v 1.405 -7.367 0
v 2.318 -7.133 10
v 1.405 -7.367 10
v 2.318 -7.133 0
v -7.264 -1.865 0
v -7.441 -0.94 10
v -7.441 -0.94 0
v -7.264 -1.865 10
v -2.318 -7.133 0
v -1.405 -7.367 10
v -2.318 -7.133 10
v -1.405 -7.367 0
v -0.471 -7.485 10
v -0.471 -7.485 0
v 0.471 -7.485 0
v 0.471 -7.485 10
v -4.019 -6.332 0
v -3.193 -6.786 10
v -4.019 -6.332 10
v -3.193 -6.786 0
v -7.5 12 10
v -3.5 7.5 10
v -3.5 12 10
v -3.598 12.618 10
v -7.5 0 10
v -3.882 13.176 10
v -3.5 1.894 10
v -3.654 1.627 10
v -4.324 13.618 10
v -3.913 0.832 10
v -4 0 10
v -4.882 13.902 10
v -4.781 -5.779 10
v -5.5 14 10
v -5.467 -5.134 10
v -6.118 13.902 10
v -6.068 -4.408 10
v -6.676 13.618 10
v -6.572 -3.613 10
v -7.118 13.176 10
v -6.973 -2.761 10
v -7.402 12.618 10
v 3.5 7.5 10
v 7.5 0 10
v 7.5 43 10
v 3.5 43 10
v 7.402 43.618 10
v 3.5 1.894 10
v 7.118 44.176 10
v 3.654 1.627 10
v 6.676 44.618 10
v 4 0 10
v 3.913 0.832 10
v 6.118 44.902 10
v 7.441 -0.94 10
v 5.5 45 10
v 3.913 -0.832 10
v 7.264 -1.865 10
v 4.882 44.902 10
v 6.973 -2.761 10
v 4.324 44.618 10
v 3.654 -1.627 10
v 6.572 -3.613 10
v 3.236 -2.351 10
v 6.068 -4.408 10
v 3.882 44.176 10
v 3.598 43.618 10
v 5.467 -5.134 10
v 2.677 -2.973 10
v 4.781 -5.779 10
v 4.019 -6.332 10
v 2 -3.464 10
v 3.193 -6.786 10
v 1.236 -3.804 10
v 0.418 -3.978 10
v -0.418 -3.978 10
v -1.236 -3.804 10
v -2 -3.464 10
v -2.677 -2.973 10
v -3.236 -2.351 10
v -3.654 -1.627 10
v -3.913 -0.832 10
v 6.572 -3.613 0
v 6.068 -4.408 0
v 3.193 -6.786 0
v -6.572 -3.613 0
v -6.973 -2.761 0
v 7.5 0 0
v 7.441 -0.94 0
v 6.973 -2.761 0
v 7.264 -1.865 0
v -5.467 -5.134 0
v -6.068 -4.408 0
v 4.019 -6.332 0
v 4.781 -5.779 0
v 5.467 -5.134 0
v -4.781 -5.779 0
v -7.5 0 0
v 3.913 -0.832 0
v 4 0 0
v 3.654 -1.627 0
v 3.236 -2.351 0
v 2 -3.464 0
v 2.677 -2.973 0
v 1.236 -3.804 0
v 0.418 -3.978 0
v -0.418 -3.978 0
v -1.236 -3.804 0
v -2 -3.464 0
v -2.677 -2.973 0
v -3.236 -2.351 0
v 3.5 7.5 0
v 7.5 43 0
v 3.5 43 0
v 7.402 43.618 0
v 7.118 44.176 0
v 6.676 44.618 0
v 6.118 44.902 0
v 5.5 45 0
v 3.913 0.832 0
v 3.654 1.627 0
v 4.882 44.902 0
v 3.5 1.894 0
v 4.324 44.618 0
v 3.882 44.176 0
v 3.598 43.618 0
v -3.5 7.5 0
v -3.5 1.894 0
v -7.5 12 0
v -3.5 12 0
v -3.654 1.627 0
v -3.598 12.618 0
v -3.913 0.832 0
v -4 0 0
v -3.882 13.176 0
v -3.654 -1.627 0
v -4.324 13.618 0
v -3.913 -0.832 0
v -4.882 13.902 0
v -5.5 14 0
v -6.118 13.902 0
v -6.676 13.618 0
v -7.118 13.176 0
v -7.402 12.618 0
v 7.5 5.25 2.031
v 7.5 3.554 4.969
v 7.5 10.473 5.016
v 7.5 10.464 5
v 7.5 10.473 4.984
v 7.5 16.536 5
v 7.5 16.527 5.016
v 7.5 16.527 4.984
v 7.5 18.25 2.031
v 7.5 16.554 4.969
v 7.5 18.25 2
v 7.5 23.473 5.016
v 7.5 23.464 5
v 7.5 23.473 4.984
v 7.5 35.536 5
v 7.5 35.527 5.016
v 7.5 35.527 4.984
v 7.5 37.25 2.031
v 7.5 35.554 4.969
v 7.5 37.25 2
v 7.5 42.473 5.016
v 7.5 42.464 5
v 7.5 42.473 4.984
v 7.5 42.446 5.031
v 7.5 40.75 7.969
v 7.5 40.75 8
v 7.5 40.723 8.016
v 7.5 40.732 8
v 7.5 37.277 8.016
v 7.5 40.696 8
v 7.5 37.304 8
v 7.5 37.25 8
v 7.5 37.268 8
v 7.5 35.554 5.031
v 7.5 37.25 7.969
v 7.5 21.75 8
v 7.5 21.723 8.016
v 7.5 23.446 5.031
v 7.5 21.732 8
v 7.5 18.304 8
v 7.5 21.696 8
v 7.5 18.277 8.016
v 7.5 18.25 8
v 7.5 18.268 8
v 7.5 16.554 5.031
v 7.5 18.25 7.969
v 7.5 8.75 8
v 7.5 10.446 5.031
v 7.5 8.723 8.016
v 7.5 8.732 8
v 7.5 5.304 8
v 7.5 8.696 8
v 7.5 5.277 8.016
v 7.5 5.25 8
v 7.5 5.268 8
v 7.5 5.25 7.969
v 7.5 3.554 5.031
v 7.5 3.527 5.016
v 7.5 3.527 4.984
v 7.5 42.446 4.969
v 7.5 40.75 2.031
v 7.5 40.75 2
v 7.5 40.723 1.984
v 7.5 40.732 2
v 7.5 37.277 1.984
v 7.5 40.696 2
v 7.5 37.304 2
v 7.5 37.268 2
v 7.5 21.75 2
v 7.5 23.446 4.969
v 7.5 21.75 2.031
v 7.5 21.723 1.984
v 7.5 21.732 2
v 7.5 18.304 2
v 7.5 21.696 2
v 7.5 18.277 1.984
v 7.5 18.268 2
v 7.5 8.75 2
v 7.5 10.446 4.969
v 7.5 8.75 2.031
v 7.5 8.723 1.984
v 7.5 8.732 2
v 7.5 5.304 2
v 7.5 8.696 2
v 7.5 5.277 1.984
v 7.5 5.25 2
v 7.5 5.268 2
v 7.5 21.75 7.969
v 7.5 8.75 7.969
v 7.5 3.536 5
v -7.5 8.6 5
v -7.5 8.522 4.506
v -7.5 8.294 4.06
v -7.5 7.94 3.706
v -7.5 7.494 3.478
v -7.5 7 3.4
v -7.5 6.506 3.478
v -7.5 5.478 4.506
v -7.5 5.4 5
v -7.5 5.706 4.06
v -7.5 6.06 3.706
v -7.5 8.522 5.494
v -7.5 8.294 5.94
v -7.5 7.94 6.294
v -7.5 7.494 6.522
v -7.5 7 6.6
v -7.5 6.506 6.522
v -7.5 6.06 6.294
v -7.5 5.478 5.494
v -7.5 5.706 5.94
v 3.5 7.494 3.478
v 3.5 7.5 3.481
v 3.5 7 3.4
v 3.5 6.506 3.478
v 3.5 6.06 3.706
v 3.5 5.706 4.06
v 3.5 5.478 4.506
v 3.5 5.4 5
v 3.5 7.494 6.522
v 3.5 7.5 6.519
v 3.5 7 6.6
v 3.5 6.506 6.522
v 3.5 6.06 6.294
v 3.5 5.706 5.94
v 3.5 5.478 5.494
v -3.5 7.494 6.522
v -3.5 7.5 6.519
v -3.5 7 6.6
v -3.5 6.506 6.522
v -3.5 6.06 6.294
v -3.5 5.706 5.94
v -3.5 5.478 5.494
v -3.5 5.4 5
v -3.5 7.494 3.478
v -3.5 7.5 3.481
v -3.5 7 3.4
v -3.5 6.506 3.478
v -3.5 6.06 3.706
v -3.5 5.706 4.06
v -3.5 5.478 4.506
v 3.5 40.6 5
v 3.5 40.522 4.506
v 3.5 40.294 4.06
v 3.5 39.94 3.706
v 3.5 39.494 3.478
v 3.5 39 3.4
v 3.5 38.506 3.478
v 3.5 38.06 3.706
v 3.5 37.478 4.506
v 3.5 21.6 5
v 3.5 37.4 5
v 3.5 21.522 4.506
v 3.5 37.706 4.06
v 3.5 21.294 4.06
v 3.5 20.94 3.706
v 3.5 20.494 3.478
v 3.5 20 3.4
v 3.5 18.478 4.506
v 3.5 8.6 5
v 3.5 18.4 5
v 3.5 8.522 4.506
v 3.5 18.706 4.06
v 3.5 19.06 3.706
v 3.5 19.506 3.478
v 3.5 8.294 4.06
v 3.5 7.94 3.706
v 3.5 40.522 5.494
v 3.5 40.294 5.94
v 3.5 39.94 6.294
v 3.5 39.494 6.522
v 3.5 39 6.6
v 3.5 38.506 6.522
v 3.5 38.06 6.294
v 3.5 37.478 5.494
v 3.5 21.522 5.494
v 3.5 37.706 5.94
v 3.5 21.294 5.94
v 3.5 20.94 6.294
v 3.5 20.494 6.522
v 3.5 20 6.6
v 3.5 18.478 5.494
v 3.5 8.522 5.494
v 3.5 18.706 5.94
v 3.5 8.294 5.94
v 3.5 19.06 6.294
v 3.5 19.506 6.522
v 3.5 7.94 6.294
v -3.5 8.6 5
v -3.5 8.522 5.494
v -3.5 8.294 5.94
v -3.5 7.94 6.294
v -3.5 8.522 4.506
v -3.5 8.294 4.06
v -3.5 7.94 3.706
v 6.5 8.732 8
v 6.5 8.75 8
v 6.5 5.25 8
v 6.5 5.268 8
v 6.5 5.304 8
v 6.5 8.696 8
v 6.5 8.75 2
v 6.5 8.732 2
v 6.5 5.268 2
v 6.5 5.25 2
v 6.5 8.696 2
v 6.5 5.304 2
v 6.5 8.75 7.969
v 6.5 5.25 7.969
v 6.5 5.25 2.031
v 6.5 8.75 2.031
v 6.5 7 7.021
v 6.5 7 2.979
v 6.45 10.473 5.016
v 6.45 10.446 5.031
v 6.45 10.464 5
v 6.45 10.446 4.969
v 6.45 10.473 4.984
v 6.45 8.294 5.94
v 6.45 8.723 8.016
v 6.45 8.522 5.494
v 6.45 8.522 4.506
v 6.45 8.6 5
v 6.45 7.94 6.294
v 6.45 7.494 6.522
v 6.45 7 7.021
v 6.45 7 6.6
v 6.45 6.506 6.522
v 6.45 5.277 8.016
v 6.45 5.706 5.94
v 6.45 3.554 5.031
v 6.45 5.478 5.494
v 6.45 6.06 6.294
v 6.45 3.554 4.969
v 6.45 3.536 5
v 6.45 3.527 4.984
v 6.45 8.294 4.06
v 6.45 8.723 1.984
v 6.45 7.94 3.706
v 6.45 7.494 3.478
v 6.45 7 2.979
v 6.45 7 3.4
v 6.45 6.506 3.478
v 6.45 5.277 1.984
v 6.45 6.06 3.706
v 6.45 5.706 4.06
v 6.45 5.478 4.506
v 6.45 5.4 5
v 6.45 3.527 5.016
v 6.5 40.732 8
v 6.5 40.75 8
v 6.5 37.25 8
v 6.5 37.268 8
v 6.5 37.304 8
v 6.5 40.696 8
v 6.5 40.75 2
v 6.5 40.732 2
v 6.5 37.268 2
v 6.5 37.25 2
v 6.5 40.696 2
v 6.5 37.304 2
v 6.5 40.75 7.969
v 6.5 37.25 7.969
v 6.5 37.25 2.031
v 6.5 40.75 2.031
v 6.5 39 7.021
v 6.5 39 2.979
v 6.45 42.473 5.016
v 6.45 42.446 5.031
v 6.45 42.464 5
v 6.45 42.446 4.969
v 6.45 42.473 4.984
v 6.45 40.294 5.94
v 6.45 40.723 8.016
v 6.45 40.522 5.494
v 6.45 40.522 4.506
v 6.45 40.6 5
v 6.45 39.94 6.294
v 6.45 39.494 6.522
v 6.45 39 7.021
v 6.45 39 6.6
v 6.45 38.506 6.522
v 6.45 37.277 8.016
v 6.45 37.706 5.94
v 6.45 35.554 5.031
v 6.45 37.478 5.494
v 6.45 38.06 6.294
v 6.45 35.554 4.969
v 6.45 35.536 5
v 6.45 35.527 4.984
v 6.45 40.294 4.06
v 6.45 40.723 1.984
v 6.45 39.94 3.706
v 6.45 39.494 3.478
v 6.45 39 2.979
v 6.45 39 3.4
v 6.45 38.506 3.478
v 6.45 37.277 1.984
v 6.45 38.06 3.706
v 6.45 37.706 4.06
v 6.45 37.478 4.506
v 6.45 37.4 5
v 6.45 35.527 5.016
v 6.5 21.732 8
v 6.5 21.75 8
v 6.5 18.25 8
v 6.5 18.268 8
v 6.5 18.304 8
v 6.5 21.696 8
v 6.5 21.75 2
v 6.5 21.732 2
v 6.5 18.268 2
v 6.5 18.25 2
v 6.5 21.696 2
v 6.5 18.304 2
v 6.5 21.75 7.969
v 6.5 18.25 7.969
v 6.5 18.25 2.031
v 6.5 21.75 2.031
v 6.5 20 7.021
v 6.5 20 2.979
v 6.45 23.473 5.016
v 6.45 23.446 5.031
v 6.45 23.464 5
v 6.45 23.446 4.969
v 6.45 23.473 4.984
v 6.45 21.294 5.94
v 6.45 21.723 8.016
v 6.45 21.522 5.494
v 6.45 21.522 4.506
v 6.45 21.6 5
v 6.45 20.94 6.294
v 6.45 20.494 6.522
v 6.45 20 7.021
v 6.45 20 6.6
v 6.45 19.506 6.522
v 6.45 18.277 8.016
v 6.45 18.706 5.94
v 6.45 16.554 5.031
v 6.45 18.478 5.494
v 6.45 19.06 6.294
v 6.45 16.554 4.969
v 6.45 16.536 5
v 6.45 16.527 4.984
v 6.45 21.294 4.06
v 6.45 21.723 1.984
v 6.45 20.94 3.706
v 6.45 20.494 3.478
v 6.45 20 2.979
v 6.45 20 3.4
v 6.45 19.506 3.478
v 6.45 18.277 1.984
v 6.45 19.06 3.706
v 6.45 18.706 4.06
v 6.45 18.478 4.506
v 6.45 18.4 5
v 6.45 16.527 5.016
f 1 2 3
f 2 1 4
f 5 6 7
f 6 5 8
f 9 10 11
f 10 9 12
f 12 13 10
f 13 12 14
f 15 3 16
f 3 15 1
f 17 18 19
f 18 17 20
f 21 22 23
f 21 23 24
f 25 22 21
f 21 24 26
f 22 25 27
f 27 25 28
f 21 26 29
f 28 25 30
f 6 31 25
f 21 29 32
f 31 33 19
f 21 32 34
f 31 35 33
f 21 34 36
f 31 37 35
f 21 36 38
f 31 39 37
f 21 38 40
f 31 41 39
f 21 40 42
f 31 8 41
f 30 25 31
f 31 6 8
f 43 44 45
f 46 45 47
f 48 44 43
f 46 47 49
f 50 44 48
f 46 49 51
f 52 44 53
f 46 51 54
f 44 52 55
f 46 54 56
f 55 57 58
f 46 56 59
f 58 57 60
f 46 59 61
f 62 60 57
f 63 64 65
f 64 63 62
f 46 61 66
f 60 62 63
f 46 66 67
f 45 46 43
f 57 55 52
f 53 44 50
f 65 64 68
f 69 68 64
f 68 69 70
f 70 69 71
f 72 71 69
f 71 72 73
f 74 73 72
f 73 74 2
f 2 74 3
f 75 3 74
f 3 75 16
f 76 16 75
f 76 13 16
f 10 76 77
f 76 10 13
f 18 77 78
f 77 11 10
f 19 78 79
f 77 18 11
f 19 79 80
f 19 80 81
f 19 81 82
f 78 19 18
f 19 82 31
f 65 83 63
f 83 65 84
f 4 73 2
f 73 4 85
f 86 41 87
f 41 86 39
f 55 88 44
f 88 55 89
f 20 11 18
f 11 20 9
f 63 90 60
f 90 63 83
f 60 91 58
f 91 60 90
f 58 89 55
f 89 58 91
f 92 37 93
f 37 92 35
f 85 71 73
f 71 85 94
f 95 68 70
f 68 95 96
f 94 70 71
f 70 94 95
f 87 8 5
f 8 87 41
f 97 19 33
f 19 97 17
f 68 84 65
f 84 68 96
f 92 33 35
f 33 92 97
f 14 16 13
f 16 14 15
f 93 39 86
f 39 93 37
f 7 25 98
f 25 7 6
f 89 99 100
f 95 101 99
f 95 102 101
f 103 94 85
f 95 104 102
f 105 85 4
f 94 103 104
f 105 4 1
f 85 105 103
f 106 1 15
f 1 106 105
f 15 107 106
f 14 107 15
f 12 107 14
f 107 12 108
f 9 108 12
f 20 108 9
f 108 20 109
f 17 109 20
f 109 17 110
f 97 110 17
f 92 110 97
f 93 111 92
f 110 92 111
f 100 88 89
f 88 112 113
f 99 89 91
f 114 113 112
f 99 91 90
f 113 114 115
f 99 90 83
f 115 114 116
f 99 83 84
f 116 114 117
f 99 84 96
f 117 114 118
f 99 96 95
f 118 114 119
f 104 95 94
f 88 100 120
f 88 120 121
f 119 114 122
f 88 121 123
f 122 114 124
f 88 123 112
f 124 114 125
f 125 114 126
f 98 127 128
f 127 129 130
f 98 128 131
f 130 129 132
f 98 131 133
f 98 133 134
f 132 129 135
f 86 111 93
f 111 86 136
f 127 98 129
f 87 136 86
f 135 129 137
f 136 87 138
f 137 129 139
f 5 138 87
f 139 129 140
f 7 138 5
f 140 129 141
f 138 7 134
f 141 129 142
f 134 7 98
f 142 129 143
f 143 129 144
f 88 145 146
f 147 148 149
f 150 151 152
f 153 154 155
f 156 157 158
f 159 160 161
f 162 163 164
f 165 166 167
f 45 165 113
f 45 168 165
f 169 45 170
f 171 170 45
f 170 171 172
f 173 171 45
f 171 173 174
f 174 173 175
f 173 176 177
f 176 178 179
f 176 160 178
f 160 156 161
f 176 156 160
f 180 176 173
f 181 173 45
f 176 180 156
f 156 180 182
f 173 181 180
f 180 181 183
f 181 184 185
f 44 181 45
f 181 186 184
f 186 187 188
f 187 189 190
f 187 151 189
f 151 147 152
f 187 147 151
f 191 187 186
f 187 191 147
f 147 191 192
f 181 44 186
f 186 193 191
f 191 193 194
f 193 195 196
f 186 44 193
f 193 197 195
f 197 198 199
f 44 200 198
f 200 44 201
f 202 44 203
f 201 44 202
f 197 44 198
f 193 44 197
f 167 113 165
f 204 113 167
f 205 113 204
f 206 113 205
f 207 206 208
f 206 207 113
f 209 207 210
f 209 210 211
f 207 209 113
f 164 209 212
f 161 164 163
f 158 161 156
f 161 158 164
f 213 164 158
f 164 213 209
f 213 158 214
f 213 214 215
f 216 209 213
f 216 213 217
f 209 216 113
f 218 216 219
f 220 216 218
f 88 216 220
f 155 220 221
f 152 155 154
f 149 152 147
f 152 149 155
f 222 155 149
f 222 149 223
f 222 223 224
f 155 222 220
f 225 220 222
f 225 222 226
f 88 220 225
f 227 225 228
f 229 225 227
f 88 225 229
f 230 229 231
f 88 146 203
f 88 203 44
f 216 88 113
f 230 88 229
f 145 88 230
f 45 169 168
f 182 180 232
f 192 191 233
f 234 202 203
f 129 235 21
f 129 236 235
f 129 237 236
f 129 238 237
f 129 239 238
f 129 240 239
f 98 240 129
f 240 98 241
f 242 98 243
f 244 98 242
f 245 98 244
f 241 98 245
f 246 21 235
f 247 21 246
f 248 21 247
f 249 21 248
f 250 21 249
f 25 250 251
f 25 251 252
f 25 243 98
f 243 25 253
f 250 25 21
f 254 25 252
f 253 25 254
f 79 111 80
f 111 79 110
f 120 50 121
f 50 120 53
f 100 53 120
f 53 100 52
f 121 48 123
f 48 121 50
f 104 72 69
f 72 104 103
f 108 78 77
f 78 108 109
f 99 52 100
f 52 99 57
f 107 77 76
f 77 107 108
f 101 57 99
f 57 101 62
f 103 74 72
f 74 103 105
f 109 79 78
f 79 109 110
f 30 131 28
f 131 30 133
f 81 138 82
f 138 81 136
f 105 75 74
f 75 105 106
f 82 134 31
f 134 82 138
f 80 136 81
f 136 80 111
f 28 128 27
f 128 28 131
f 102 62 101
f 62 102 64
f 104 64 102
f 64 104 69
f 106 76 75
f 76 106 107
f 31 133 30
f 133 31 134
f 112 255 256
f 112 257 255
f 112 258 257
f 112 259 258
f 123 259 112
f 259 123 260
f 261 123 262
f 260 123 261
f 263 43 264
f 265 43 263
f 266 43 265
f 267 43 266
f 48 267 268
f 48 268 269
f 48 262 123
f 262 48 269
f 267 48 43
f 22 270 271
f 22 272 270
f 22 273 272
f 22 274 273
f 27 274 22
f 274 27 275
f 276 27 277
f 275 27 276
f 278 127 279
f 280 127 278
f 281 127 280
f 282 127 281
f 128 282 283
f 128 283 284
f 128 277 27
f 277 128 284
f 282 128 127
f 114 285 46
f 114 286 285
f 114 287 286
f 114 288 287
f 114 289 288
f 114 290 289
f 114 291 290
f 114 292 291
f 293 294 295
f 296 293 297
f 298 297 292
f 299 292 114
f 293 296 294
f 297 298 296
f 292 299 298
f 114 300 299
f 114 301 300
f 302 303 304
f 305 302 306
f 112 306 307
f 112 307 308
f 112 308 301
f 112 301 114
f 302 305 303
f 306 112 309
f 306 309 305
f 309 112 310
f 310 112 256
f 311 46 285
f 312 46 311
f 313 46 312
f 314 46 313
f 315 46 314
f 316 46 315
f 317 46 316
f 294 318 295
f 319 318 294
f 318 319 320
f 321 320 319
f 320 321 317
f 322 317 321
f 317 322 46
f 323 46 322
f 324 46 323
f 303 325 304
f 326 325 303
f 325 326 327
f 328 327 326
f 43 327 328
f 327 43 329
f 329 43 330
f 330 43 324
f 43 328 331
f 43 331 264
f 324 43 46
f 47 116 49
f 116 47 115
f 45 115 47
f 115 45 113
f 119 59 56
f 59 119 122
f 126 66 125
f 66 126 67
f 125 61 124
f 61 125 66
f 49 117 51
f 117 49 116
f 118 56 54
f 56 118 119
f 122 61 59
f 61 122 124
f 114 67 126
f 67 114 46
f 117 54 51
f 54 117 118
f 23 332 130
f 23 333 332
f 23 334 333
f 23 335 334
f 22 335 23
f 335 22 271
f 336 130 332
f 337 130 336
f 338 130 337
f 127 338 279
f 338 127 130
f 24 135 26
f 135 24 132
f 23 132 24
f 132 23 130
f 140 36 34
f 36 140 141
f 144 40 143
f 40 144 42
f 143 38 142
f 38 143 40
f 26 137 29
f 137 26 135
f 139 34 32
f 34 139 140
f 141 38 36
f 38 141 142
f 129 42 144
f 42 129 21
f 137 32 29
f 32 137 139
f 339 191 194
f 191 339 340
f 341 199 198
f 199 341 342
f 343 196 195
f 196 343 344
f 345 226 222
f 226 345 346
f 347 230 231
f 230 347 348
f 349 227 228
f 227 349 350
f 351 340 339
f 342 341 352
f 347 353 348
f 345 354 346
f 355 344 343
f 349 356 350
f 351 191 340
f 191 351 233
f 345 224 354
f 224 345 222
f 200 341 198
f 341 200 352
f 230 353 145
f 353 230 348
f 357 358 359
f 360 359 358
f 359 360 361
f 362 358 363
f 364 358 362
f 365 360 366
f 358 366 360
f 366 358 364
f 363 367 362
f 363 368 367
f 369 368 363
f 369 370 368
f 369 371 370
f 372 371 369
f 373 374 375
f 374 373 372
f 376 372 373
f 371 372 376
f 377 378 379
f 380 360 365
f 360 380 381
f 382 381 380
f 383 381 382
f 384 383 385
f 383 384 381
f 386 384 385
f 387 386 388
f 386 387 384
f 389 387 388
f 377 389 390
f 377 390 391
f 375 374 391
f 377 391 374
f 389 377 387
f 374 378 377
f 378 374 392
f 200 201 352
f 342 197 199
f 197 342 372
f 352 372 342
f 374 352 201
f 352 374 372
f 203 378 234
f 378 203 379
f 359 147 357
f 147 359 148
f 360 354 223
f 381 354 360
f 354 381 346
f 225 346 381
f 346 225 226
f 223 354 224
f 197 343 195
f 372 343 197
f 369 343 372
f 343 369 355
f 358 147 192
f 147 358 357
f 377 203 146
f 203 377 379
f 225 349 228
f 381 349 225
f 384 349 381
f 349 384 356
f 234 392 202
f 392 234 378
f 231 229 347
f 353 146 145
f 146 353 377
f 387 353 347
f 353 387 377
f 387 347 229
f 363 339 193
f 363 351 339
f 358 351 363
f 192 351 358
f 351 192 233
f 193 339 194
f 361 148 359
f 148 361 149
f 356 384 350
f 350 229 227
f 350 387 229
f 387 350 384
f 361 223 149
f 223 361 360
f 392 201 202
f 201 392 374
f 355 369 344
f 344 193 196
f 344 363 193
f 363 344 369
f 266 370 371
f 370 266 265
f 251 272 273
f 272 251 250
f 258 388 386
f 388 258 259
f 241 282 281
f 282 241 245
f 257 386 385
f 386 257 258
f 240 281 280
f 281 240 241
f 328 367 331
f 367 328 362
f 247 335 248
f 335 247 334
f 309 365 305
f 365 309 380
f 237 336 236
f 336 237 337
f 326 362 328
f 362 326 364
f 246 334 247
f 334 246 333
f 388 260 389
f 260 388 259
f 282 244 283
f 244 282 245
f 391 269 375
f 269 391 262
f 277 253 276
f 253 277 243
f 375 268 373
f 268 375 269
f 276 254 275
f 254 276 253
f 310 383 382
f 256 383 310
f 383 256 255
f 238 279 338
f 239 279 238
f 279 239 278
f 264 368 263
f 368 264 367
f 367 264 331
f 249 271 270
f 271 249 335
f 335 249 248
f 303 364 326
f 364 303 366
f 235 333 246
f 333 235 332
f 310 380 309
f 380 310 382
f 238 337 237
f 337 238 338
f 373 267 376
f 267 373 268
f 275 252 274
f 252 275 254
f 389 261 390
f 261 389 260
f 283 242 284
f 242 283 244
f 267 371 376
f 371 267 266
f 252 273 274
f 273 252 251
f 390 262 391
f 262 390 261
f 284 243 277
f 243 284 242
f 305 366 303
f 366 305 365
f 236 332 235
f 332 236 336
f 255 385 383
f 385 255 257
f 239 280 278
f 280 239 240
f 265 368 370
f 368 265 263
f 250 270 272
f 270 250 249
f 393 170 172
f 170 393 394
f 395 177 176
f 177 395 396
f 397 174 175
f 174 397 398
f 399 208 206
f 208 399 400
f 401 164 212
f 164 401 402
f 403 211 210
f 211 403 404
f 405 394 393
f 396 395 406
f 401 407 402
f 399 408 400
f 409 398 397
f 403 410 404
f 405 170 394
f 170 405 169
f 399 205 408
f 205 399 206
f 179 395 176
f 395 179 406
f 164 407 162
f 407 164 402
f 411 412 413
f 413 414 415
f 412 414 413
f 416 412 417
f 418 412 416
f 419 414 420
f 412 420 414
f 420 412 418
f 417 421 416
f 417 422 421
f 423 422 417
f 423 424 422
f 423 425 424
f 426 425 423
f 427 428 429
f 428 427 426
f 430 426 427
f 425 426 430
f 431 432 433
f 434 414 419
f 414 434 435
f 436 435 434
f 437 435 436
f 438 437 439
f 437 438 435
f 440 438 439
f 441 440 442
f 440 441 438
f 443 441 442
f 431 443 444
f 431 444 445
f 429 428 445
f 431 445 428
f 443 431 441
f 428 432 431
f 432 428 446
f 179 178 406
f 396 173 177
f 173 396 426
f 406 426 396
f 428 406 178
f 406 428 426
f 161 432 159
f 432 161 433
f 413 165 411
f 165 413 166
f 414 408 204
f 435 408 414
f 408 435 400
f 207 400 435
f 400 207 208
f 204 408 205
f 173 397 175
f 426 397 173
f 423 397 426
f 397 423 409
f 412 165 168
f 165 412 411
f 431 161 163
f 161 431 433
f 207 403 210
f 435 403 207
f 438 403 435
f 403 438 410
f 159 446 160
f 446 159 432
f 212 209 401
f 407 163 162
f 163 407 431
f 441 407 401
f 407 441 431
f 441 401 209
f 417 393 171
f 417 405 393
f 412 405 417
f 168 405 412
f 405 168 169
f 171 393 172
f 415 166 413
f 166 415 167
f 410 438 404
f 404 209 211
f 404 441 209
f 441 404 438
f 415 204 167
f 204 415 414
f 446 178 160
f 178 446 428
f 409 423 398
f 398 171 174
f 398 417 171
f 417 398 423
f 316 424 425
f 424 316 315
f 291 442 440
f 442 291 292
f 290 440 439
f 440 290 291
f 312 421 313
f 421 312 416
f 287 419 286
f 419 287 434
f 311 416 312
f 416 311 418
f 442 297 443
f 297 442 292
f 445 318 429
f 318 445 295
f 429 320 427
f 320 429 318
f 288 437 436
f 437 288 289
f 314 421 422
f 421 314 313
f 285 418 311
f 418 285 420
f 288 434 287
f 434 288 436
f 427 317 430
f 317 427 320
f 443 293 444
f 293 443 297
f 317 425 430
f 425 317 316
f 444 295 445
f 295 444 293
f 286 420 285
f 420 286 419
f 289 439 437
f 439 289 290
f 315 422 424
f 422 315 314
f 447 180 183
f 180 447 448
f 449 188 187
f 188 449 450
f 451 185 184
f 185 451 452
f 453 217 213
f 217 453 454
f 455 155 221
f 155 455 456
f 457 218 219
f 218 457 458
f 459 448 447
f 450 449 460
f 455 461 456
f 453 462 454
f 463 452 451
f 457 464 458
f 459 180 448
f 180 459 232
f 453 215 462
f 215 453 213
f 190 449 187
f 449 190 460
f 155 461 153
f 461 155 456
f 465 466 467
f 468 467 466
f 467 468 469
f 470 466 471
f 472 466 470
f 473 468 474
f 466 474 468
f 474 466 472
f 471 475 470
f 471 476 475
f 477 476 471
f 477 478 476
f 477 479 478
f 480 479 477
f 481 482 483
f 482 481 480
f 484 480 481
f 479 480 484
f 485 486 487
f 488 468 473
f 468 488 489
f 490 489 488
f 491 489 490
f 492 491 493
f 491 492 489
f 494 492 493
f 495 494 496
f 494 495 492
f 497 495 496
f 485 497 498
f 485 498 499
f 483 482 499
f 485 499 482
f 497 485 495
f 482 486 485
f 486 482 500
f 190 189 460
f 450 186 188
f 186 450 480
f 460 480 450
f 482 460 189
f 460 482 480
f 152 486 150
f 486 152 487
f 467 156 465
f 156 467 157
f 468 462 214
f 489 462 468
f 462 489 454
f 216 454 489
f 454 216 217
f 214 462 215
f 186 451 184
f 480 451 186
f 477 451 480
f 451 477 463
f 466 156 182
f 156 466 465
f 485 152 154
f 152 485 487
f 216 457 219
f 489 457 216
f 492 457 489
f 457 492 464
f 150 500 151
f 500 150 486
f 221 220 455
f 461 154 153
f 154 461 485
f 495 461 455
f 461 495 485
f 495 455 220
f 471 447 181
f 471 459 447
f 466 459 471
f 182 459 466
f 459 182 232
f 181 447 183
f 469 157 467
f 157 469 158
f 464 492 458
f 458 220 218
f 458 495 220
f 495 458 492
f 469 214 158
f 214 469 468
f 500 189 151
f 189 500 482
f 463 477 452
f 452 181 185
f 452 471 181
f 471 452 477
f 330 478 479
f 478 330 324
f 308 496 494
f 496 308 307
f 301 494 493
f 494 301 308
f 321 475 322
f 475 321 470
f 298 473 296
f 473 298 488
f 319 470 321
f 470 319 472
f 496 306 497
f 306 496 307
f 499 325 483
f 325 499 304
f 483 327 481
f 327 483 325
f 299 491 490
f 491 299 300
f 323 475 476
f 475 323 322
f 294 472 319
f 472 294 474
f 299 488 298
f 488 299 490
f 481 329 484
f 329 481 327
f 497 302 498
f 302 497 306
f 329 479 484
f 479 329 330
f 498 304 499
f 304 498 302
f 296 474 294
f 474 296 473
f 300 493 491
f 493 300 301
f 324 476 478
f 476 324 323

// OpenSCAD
rodDiameter = 8;
mainWall = 4;
height = 10;
endstopSpacing = 19;

module mainCurve(rod = 8, wall = 4, h = 10) {
	extra = 0.5;
	curveWall = wall - extra;
	innerRad = rod/2;
	outerRad = (innerRad + curveWall);
	difference() {
		union() {
			cylinder(h=h, r = outerRad, $fn=50);
			translate([-outerRad,0,0]) cube([2*outerRad,outerRad,h]);
		}
		translate([0,0,-0.1]) cylinder(h=(h+0.2), r = innerRad, $fn=30);
		translate([-innerRad+extra, 0, -0.1]) cube([rod-2*extra, outerRad+0.1, (h+0.2)]);
	}
}

module leg(length = 32, thickness = 4, h = 10) {
	wallThickness = thickness - 0.5;
	cube([thickness, length, h]);
	translate([thickness/2, length, 0]) cylinder(h=h, r=(thickness/2), $fn=20);
}

module m3withTolerance(length = 30) {
	union() {
		cube([2,3.5,6], center=true);
		rotate([60,0,0]) cube([2.1,3.5,6], center=true);
		rotate([120,0,0]) cube([2.1,3.5,6], center=true);
		rotate([0, 90, 180]) cylinder(h = length + 0.1, r = 1.6, $fn= 20);
	}
}

module mainBody(wall = 4, rod = 8, h = 10) {
	wallThickness = wall - 0.5;
	innerRadius = rod/2;
	outerRadius = (innerRadius + wallThickness);
	shortLeg = rod/2 + 8;
	longLeg = shortLeg + 12 + endstopSpacing;
	
	difference() {
		//the body of the holder
		union() {
			mainCurve(rod, wall, h);
			
			translate([outerRadius - wall, outerRadius,0]) 
				leg(longLeg - outerRadius, wall, h);
			
			translate([-outerRadius,outerRadius,0])
				leg(shortLeg - outerRadius, wall, h);
		}
		//holes for m3 screws with spaces for nuts
		color([1,0,0]) {
			translate([outerRadius,shortLeg - 5,height - 5])
				m3withTolerance(outerRadius*2);
		
			translate([outerRadius,longLeg - 4,height - 5])
				m3withTolerance(outerRadius*2);
			translate([outerRadius,longLeg - 4 - endstopSpacing,height - 5])
				m3withTolerance(outerRadius*2);
		}
	}
}

mainBody(mainWall, rodDiameter, height);
